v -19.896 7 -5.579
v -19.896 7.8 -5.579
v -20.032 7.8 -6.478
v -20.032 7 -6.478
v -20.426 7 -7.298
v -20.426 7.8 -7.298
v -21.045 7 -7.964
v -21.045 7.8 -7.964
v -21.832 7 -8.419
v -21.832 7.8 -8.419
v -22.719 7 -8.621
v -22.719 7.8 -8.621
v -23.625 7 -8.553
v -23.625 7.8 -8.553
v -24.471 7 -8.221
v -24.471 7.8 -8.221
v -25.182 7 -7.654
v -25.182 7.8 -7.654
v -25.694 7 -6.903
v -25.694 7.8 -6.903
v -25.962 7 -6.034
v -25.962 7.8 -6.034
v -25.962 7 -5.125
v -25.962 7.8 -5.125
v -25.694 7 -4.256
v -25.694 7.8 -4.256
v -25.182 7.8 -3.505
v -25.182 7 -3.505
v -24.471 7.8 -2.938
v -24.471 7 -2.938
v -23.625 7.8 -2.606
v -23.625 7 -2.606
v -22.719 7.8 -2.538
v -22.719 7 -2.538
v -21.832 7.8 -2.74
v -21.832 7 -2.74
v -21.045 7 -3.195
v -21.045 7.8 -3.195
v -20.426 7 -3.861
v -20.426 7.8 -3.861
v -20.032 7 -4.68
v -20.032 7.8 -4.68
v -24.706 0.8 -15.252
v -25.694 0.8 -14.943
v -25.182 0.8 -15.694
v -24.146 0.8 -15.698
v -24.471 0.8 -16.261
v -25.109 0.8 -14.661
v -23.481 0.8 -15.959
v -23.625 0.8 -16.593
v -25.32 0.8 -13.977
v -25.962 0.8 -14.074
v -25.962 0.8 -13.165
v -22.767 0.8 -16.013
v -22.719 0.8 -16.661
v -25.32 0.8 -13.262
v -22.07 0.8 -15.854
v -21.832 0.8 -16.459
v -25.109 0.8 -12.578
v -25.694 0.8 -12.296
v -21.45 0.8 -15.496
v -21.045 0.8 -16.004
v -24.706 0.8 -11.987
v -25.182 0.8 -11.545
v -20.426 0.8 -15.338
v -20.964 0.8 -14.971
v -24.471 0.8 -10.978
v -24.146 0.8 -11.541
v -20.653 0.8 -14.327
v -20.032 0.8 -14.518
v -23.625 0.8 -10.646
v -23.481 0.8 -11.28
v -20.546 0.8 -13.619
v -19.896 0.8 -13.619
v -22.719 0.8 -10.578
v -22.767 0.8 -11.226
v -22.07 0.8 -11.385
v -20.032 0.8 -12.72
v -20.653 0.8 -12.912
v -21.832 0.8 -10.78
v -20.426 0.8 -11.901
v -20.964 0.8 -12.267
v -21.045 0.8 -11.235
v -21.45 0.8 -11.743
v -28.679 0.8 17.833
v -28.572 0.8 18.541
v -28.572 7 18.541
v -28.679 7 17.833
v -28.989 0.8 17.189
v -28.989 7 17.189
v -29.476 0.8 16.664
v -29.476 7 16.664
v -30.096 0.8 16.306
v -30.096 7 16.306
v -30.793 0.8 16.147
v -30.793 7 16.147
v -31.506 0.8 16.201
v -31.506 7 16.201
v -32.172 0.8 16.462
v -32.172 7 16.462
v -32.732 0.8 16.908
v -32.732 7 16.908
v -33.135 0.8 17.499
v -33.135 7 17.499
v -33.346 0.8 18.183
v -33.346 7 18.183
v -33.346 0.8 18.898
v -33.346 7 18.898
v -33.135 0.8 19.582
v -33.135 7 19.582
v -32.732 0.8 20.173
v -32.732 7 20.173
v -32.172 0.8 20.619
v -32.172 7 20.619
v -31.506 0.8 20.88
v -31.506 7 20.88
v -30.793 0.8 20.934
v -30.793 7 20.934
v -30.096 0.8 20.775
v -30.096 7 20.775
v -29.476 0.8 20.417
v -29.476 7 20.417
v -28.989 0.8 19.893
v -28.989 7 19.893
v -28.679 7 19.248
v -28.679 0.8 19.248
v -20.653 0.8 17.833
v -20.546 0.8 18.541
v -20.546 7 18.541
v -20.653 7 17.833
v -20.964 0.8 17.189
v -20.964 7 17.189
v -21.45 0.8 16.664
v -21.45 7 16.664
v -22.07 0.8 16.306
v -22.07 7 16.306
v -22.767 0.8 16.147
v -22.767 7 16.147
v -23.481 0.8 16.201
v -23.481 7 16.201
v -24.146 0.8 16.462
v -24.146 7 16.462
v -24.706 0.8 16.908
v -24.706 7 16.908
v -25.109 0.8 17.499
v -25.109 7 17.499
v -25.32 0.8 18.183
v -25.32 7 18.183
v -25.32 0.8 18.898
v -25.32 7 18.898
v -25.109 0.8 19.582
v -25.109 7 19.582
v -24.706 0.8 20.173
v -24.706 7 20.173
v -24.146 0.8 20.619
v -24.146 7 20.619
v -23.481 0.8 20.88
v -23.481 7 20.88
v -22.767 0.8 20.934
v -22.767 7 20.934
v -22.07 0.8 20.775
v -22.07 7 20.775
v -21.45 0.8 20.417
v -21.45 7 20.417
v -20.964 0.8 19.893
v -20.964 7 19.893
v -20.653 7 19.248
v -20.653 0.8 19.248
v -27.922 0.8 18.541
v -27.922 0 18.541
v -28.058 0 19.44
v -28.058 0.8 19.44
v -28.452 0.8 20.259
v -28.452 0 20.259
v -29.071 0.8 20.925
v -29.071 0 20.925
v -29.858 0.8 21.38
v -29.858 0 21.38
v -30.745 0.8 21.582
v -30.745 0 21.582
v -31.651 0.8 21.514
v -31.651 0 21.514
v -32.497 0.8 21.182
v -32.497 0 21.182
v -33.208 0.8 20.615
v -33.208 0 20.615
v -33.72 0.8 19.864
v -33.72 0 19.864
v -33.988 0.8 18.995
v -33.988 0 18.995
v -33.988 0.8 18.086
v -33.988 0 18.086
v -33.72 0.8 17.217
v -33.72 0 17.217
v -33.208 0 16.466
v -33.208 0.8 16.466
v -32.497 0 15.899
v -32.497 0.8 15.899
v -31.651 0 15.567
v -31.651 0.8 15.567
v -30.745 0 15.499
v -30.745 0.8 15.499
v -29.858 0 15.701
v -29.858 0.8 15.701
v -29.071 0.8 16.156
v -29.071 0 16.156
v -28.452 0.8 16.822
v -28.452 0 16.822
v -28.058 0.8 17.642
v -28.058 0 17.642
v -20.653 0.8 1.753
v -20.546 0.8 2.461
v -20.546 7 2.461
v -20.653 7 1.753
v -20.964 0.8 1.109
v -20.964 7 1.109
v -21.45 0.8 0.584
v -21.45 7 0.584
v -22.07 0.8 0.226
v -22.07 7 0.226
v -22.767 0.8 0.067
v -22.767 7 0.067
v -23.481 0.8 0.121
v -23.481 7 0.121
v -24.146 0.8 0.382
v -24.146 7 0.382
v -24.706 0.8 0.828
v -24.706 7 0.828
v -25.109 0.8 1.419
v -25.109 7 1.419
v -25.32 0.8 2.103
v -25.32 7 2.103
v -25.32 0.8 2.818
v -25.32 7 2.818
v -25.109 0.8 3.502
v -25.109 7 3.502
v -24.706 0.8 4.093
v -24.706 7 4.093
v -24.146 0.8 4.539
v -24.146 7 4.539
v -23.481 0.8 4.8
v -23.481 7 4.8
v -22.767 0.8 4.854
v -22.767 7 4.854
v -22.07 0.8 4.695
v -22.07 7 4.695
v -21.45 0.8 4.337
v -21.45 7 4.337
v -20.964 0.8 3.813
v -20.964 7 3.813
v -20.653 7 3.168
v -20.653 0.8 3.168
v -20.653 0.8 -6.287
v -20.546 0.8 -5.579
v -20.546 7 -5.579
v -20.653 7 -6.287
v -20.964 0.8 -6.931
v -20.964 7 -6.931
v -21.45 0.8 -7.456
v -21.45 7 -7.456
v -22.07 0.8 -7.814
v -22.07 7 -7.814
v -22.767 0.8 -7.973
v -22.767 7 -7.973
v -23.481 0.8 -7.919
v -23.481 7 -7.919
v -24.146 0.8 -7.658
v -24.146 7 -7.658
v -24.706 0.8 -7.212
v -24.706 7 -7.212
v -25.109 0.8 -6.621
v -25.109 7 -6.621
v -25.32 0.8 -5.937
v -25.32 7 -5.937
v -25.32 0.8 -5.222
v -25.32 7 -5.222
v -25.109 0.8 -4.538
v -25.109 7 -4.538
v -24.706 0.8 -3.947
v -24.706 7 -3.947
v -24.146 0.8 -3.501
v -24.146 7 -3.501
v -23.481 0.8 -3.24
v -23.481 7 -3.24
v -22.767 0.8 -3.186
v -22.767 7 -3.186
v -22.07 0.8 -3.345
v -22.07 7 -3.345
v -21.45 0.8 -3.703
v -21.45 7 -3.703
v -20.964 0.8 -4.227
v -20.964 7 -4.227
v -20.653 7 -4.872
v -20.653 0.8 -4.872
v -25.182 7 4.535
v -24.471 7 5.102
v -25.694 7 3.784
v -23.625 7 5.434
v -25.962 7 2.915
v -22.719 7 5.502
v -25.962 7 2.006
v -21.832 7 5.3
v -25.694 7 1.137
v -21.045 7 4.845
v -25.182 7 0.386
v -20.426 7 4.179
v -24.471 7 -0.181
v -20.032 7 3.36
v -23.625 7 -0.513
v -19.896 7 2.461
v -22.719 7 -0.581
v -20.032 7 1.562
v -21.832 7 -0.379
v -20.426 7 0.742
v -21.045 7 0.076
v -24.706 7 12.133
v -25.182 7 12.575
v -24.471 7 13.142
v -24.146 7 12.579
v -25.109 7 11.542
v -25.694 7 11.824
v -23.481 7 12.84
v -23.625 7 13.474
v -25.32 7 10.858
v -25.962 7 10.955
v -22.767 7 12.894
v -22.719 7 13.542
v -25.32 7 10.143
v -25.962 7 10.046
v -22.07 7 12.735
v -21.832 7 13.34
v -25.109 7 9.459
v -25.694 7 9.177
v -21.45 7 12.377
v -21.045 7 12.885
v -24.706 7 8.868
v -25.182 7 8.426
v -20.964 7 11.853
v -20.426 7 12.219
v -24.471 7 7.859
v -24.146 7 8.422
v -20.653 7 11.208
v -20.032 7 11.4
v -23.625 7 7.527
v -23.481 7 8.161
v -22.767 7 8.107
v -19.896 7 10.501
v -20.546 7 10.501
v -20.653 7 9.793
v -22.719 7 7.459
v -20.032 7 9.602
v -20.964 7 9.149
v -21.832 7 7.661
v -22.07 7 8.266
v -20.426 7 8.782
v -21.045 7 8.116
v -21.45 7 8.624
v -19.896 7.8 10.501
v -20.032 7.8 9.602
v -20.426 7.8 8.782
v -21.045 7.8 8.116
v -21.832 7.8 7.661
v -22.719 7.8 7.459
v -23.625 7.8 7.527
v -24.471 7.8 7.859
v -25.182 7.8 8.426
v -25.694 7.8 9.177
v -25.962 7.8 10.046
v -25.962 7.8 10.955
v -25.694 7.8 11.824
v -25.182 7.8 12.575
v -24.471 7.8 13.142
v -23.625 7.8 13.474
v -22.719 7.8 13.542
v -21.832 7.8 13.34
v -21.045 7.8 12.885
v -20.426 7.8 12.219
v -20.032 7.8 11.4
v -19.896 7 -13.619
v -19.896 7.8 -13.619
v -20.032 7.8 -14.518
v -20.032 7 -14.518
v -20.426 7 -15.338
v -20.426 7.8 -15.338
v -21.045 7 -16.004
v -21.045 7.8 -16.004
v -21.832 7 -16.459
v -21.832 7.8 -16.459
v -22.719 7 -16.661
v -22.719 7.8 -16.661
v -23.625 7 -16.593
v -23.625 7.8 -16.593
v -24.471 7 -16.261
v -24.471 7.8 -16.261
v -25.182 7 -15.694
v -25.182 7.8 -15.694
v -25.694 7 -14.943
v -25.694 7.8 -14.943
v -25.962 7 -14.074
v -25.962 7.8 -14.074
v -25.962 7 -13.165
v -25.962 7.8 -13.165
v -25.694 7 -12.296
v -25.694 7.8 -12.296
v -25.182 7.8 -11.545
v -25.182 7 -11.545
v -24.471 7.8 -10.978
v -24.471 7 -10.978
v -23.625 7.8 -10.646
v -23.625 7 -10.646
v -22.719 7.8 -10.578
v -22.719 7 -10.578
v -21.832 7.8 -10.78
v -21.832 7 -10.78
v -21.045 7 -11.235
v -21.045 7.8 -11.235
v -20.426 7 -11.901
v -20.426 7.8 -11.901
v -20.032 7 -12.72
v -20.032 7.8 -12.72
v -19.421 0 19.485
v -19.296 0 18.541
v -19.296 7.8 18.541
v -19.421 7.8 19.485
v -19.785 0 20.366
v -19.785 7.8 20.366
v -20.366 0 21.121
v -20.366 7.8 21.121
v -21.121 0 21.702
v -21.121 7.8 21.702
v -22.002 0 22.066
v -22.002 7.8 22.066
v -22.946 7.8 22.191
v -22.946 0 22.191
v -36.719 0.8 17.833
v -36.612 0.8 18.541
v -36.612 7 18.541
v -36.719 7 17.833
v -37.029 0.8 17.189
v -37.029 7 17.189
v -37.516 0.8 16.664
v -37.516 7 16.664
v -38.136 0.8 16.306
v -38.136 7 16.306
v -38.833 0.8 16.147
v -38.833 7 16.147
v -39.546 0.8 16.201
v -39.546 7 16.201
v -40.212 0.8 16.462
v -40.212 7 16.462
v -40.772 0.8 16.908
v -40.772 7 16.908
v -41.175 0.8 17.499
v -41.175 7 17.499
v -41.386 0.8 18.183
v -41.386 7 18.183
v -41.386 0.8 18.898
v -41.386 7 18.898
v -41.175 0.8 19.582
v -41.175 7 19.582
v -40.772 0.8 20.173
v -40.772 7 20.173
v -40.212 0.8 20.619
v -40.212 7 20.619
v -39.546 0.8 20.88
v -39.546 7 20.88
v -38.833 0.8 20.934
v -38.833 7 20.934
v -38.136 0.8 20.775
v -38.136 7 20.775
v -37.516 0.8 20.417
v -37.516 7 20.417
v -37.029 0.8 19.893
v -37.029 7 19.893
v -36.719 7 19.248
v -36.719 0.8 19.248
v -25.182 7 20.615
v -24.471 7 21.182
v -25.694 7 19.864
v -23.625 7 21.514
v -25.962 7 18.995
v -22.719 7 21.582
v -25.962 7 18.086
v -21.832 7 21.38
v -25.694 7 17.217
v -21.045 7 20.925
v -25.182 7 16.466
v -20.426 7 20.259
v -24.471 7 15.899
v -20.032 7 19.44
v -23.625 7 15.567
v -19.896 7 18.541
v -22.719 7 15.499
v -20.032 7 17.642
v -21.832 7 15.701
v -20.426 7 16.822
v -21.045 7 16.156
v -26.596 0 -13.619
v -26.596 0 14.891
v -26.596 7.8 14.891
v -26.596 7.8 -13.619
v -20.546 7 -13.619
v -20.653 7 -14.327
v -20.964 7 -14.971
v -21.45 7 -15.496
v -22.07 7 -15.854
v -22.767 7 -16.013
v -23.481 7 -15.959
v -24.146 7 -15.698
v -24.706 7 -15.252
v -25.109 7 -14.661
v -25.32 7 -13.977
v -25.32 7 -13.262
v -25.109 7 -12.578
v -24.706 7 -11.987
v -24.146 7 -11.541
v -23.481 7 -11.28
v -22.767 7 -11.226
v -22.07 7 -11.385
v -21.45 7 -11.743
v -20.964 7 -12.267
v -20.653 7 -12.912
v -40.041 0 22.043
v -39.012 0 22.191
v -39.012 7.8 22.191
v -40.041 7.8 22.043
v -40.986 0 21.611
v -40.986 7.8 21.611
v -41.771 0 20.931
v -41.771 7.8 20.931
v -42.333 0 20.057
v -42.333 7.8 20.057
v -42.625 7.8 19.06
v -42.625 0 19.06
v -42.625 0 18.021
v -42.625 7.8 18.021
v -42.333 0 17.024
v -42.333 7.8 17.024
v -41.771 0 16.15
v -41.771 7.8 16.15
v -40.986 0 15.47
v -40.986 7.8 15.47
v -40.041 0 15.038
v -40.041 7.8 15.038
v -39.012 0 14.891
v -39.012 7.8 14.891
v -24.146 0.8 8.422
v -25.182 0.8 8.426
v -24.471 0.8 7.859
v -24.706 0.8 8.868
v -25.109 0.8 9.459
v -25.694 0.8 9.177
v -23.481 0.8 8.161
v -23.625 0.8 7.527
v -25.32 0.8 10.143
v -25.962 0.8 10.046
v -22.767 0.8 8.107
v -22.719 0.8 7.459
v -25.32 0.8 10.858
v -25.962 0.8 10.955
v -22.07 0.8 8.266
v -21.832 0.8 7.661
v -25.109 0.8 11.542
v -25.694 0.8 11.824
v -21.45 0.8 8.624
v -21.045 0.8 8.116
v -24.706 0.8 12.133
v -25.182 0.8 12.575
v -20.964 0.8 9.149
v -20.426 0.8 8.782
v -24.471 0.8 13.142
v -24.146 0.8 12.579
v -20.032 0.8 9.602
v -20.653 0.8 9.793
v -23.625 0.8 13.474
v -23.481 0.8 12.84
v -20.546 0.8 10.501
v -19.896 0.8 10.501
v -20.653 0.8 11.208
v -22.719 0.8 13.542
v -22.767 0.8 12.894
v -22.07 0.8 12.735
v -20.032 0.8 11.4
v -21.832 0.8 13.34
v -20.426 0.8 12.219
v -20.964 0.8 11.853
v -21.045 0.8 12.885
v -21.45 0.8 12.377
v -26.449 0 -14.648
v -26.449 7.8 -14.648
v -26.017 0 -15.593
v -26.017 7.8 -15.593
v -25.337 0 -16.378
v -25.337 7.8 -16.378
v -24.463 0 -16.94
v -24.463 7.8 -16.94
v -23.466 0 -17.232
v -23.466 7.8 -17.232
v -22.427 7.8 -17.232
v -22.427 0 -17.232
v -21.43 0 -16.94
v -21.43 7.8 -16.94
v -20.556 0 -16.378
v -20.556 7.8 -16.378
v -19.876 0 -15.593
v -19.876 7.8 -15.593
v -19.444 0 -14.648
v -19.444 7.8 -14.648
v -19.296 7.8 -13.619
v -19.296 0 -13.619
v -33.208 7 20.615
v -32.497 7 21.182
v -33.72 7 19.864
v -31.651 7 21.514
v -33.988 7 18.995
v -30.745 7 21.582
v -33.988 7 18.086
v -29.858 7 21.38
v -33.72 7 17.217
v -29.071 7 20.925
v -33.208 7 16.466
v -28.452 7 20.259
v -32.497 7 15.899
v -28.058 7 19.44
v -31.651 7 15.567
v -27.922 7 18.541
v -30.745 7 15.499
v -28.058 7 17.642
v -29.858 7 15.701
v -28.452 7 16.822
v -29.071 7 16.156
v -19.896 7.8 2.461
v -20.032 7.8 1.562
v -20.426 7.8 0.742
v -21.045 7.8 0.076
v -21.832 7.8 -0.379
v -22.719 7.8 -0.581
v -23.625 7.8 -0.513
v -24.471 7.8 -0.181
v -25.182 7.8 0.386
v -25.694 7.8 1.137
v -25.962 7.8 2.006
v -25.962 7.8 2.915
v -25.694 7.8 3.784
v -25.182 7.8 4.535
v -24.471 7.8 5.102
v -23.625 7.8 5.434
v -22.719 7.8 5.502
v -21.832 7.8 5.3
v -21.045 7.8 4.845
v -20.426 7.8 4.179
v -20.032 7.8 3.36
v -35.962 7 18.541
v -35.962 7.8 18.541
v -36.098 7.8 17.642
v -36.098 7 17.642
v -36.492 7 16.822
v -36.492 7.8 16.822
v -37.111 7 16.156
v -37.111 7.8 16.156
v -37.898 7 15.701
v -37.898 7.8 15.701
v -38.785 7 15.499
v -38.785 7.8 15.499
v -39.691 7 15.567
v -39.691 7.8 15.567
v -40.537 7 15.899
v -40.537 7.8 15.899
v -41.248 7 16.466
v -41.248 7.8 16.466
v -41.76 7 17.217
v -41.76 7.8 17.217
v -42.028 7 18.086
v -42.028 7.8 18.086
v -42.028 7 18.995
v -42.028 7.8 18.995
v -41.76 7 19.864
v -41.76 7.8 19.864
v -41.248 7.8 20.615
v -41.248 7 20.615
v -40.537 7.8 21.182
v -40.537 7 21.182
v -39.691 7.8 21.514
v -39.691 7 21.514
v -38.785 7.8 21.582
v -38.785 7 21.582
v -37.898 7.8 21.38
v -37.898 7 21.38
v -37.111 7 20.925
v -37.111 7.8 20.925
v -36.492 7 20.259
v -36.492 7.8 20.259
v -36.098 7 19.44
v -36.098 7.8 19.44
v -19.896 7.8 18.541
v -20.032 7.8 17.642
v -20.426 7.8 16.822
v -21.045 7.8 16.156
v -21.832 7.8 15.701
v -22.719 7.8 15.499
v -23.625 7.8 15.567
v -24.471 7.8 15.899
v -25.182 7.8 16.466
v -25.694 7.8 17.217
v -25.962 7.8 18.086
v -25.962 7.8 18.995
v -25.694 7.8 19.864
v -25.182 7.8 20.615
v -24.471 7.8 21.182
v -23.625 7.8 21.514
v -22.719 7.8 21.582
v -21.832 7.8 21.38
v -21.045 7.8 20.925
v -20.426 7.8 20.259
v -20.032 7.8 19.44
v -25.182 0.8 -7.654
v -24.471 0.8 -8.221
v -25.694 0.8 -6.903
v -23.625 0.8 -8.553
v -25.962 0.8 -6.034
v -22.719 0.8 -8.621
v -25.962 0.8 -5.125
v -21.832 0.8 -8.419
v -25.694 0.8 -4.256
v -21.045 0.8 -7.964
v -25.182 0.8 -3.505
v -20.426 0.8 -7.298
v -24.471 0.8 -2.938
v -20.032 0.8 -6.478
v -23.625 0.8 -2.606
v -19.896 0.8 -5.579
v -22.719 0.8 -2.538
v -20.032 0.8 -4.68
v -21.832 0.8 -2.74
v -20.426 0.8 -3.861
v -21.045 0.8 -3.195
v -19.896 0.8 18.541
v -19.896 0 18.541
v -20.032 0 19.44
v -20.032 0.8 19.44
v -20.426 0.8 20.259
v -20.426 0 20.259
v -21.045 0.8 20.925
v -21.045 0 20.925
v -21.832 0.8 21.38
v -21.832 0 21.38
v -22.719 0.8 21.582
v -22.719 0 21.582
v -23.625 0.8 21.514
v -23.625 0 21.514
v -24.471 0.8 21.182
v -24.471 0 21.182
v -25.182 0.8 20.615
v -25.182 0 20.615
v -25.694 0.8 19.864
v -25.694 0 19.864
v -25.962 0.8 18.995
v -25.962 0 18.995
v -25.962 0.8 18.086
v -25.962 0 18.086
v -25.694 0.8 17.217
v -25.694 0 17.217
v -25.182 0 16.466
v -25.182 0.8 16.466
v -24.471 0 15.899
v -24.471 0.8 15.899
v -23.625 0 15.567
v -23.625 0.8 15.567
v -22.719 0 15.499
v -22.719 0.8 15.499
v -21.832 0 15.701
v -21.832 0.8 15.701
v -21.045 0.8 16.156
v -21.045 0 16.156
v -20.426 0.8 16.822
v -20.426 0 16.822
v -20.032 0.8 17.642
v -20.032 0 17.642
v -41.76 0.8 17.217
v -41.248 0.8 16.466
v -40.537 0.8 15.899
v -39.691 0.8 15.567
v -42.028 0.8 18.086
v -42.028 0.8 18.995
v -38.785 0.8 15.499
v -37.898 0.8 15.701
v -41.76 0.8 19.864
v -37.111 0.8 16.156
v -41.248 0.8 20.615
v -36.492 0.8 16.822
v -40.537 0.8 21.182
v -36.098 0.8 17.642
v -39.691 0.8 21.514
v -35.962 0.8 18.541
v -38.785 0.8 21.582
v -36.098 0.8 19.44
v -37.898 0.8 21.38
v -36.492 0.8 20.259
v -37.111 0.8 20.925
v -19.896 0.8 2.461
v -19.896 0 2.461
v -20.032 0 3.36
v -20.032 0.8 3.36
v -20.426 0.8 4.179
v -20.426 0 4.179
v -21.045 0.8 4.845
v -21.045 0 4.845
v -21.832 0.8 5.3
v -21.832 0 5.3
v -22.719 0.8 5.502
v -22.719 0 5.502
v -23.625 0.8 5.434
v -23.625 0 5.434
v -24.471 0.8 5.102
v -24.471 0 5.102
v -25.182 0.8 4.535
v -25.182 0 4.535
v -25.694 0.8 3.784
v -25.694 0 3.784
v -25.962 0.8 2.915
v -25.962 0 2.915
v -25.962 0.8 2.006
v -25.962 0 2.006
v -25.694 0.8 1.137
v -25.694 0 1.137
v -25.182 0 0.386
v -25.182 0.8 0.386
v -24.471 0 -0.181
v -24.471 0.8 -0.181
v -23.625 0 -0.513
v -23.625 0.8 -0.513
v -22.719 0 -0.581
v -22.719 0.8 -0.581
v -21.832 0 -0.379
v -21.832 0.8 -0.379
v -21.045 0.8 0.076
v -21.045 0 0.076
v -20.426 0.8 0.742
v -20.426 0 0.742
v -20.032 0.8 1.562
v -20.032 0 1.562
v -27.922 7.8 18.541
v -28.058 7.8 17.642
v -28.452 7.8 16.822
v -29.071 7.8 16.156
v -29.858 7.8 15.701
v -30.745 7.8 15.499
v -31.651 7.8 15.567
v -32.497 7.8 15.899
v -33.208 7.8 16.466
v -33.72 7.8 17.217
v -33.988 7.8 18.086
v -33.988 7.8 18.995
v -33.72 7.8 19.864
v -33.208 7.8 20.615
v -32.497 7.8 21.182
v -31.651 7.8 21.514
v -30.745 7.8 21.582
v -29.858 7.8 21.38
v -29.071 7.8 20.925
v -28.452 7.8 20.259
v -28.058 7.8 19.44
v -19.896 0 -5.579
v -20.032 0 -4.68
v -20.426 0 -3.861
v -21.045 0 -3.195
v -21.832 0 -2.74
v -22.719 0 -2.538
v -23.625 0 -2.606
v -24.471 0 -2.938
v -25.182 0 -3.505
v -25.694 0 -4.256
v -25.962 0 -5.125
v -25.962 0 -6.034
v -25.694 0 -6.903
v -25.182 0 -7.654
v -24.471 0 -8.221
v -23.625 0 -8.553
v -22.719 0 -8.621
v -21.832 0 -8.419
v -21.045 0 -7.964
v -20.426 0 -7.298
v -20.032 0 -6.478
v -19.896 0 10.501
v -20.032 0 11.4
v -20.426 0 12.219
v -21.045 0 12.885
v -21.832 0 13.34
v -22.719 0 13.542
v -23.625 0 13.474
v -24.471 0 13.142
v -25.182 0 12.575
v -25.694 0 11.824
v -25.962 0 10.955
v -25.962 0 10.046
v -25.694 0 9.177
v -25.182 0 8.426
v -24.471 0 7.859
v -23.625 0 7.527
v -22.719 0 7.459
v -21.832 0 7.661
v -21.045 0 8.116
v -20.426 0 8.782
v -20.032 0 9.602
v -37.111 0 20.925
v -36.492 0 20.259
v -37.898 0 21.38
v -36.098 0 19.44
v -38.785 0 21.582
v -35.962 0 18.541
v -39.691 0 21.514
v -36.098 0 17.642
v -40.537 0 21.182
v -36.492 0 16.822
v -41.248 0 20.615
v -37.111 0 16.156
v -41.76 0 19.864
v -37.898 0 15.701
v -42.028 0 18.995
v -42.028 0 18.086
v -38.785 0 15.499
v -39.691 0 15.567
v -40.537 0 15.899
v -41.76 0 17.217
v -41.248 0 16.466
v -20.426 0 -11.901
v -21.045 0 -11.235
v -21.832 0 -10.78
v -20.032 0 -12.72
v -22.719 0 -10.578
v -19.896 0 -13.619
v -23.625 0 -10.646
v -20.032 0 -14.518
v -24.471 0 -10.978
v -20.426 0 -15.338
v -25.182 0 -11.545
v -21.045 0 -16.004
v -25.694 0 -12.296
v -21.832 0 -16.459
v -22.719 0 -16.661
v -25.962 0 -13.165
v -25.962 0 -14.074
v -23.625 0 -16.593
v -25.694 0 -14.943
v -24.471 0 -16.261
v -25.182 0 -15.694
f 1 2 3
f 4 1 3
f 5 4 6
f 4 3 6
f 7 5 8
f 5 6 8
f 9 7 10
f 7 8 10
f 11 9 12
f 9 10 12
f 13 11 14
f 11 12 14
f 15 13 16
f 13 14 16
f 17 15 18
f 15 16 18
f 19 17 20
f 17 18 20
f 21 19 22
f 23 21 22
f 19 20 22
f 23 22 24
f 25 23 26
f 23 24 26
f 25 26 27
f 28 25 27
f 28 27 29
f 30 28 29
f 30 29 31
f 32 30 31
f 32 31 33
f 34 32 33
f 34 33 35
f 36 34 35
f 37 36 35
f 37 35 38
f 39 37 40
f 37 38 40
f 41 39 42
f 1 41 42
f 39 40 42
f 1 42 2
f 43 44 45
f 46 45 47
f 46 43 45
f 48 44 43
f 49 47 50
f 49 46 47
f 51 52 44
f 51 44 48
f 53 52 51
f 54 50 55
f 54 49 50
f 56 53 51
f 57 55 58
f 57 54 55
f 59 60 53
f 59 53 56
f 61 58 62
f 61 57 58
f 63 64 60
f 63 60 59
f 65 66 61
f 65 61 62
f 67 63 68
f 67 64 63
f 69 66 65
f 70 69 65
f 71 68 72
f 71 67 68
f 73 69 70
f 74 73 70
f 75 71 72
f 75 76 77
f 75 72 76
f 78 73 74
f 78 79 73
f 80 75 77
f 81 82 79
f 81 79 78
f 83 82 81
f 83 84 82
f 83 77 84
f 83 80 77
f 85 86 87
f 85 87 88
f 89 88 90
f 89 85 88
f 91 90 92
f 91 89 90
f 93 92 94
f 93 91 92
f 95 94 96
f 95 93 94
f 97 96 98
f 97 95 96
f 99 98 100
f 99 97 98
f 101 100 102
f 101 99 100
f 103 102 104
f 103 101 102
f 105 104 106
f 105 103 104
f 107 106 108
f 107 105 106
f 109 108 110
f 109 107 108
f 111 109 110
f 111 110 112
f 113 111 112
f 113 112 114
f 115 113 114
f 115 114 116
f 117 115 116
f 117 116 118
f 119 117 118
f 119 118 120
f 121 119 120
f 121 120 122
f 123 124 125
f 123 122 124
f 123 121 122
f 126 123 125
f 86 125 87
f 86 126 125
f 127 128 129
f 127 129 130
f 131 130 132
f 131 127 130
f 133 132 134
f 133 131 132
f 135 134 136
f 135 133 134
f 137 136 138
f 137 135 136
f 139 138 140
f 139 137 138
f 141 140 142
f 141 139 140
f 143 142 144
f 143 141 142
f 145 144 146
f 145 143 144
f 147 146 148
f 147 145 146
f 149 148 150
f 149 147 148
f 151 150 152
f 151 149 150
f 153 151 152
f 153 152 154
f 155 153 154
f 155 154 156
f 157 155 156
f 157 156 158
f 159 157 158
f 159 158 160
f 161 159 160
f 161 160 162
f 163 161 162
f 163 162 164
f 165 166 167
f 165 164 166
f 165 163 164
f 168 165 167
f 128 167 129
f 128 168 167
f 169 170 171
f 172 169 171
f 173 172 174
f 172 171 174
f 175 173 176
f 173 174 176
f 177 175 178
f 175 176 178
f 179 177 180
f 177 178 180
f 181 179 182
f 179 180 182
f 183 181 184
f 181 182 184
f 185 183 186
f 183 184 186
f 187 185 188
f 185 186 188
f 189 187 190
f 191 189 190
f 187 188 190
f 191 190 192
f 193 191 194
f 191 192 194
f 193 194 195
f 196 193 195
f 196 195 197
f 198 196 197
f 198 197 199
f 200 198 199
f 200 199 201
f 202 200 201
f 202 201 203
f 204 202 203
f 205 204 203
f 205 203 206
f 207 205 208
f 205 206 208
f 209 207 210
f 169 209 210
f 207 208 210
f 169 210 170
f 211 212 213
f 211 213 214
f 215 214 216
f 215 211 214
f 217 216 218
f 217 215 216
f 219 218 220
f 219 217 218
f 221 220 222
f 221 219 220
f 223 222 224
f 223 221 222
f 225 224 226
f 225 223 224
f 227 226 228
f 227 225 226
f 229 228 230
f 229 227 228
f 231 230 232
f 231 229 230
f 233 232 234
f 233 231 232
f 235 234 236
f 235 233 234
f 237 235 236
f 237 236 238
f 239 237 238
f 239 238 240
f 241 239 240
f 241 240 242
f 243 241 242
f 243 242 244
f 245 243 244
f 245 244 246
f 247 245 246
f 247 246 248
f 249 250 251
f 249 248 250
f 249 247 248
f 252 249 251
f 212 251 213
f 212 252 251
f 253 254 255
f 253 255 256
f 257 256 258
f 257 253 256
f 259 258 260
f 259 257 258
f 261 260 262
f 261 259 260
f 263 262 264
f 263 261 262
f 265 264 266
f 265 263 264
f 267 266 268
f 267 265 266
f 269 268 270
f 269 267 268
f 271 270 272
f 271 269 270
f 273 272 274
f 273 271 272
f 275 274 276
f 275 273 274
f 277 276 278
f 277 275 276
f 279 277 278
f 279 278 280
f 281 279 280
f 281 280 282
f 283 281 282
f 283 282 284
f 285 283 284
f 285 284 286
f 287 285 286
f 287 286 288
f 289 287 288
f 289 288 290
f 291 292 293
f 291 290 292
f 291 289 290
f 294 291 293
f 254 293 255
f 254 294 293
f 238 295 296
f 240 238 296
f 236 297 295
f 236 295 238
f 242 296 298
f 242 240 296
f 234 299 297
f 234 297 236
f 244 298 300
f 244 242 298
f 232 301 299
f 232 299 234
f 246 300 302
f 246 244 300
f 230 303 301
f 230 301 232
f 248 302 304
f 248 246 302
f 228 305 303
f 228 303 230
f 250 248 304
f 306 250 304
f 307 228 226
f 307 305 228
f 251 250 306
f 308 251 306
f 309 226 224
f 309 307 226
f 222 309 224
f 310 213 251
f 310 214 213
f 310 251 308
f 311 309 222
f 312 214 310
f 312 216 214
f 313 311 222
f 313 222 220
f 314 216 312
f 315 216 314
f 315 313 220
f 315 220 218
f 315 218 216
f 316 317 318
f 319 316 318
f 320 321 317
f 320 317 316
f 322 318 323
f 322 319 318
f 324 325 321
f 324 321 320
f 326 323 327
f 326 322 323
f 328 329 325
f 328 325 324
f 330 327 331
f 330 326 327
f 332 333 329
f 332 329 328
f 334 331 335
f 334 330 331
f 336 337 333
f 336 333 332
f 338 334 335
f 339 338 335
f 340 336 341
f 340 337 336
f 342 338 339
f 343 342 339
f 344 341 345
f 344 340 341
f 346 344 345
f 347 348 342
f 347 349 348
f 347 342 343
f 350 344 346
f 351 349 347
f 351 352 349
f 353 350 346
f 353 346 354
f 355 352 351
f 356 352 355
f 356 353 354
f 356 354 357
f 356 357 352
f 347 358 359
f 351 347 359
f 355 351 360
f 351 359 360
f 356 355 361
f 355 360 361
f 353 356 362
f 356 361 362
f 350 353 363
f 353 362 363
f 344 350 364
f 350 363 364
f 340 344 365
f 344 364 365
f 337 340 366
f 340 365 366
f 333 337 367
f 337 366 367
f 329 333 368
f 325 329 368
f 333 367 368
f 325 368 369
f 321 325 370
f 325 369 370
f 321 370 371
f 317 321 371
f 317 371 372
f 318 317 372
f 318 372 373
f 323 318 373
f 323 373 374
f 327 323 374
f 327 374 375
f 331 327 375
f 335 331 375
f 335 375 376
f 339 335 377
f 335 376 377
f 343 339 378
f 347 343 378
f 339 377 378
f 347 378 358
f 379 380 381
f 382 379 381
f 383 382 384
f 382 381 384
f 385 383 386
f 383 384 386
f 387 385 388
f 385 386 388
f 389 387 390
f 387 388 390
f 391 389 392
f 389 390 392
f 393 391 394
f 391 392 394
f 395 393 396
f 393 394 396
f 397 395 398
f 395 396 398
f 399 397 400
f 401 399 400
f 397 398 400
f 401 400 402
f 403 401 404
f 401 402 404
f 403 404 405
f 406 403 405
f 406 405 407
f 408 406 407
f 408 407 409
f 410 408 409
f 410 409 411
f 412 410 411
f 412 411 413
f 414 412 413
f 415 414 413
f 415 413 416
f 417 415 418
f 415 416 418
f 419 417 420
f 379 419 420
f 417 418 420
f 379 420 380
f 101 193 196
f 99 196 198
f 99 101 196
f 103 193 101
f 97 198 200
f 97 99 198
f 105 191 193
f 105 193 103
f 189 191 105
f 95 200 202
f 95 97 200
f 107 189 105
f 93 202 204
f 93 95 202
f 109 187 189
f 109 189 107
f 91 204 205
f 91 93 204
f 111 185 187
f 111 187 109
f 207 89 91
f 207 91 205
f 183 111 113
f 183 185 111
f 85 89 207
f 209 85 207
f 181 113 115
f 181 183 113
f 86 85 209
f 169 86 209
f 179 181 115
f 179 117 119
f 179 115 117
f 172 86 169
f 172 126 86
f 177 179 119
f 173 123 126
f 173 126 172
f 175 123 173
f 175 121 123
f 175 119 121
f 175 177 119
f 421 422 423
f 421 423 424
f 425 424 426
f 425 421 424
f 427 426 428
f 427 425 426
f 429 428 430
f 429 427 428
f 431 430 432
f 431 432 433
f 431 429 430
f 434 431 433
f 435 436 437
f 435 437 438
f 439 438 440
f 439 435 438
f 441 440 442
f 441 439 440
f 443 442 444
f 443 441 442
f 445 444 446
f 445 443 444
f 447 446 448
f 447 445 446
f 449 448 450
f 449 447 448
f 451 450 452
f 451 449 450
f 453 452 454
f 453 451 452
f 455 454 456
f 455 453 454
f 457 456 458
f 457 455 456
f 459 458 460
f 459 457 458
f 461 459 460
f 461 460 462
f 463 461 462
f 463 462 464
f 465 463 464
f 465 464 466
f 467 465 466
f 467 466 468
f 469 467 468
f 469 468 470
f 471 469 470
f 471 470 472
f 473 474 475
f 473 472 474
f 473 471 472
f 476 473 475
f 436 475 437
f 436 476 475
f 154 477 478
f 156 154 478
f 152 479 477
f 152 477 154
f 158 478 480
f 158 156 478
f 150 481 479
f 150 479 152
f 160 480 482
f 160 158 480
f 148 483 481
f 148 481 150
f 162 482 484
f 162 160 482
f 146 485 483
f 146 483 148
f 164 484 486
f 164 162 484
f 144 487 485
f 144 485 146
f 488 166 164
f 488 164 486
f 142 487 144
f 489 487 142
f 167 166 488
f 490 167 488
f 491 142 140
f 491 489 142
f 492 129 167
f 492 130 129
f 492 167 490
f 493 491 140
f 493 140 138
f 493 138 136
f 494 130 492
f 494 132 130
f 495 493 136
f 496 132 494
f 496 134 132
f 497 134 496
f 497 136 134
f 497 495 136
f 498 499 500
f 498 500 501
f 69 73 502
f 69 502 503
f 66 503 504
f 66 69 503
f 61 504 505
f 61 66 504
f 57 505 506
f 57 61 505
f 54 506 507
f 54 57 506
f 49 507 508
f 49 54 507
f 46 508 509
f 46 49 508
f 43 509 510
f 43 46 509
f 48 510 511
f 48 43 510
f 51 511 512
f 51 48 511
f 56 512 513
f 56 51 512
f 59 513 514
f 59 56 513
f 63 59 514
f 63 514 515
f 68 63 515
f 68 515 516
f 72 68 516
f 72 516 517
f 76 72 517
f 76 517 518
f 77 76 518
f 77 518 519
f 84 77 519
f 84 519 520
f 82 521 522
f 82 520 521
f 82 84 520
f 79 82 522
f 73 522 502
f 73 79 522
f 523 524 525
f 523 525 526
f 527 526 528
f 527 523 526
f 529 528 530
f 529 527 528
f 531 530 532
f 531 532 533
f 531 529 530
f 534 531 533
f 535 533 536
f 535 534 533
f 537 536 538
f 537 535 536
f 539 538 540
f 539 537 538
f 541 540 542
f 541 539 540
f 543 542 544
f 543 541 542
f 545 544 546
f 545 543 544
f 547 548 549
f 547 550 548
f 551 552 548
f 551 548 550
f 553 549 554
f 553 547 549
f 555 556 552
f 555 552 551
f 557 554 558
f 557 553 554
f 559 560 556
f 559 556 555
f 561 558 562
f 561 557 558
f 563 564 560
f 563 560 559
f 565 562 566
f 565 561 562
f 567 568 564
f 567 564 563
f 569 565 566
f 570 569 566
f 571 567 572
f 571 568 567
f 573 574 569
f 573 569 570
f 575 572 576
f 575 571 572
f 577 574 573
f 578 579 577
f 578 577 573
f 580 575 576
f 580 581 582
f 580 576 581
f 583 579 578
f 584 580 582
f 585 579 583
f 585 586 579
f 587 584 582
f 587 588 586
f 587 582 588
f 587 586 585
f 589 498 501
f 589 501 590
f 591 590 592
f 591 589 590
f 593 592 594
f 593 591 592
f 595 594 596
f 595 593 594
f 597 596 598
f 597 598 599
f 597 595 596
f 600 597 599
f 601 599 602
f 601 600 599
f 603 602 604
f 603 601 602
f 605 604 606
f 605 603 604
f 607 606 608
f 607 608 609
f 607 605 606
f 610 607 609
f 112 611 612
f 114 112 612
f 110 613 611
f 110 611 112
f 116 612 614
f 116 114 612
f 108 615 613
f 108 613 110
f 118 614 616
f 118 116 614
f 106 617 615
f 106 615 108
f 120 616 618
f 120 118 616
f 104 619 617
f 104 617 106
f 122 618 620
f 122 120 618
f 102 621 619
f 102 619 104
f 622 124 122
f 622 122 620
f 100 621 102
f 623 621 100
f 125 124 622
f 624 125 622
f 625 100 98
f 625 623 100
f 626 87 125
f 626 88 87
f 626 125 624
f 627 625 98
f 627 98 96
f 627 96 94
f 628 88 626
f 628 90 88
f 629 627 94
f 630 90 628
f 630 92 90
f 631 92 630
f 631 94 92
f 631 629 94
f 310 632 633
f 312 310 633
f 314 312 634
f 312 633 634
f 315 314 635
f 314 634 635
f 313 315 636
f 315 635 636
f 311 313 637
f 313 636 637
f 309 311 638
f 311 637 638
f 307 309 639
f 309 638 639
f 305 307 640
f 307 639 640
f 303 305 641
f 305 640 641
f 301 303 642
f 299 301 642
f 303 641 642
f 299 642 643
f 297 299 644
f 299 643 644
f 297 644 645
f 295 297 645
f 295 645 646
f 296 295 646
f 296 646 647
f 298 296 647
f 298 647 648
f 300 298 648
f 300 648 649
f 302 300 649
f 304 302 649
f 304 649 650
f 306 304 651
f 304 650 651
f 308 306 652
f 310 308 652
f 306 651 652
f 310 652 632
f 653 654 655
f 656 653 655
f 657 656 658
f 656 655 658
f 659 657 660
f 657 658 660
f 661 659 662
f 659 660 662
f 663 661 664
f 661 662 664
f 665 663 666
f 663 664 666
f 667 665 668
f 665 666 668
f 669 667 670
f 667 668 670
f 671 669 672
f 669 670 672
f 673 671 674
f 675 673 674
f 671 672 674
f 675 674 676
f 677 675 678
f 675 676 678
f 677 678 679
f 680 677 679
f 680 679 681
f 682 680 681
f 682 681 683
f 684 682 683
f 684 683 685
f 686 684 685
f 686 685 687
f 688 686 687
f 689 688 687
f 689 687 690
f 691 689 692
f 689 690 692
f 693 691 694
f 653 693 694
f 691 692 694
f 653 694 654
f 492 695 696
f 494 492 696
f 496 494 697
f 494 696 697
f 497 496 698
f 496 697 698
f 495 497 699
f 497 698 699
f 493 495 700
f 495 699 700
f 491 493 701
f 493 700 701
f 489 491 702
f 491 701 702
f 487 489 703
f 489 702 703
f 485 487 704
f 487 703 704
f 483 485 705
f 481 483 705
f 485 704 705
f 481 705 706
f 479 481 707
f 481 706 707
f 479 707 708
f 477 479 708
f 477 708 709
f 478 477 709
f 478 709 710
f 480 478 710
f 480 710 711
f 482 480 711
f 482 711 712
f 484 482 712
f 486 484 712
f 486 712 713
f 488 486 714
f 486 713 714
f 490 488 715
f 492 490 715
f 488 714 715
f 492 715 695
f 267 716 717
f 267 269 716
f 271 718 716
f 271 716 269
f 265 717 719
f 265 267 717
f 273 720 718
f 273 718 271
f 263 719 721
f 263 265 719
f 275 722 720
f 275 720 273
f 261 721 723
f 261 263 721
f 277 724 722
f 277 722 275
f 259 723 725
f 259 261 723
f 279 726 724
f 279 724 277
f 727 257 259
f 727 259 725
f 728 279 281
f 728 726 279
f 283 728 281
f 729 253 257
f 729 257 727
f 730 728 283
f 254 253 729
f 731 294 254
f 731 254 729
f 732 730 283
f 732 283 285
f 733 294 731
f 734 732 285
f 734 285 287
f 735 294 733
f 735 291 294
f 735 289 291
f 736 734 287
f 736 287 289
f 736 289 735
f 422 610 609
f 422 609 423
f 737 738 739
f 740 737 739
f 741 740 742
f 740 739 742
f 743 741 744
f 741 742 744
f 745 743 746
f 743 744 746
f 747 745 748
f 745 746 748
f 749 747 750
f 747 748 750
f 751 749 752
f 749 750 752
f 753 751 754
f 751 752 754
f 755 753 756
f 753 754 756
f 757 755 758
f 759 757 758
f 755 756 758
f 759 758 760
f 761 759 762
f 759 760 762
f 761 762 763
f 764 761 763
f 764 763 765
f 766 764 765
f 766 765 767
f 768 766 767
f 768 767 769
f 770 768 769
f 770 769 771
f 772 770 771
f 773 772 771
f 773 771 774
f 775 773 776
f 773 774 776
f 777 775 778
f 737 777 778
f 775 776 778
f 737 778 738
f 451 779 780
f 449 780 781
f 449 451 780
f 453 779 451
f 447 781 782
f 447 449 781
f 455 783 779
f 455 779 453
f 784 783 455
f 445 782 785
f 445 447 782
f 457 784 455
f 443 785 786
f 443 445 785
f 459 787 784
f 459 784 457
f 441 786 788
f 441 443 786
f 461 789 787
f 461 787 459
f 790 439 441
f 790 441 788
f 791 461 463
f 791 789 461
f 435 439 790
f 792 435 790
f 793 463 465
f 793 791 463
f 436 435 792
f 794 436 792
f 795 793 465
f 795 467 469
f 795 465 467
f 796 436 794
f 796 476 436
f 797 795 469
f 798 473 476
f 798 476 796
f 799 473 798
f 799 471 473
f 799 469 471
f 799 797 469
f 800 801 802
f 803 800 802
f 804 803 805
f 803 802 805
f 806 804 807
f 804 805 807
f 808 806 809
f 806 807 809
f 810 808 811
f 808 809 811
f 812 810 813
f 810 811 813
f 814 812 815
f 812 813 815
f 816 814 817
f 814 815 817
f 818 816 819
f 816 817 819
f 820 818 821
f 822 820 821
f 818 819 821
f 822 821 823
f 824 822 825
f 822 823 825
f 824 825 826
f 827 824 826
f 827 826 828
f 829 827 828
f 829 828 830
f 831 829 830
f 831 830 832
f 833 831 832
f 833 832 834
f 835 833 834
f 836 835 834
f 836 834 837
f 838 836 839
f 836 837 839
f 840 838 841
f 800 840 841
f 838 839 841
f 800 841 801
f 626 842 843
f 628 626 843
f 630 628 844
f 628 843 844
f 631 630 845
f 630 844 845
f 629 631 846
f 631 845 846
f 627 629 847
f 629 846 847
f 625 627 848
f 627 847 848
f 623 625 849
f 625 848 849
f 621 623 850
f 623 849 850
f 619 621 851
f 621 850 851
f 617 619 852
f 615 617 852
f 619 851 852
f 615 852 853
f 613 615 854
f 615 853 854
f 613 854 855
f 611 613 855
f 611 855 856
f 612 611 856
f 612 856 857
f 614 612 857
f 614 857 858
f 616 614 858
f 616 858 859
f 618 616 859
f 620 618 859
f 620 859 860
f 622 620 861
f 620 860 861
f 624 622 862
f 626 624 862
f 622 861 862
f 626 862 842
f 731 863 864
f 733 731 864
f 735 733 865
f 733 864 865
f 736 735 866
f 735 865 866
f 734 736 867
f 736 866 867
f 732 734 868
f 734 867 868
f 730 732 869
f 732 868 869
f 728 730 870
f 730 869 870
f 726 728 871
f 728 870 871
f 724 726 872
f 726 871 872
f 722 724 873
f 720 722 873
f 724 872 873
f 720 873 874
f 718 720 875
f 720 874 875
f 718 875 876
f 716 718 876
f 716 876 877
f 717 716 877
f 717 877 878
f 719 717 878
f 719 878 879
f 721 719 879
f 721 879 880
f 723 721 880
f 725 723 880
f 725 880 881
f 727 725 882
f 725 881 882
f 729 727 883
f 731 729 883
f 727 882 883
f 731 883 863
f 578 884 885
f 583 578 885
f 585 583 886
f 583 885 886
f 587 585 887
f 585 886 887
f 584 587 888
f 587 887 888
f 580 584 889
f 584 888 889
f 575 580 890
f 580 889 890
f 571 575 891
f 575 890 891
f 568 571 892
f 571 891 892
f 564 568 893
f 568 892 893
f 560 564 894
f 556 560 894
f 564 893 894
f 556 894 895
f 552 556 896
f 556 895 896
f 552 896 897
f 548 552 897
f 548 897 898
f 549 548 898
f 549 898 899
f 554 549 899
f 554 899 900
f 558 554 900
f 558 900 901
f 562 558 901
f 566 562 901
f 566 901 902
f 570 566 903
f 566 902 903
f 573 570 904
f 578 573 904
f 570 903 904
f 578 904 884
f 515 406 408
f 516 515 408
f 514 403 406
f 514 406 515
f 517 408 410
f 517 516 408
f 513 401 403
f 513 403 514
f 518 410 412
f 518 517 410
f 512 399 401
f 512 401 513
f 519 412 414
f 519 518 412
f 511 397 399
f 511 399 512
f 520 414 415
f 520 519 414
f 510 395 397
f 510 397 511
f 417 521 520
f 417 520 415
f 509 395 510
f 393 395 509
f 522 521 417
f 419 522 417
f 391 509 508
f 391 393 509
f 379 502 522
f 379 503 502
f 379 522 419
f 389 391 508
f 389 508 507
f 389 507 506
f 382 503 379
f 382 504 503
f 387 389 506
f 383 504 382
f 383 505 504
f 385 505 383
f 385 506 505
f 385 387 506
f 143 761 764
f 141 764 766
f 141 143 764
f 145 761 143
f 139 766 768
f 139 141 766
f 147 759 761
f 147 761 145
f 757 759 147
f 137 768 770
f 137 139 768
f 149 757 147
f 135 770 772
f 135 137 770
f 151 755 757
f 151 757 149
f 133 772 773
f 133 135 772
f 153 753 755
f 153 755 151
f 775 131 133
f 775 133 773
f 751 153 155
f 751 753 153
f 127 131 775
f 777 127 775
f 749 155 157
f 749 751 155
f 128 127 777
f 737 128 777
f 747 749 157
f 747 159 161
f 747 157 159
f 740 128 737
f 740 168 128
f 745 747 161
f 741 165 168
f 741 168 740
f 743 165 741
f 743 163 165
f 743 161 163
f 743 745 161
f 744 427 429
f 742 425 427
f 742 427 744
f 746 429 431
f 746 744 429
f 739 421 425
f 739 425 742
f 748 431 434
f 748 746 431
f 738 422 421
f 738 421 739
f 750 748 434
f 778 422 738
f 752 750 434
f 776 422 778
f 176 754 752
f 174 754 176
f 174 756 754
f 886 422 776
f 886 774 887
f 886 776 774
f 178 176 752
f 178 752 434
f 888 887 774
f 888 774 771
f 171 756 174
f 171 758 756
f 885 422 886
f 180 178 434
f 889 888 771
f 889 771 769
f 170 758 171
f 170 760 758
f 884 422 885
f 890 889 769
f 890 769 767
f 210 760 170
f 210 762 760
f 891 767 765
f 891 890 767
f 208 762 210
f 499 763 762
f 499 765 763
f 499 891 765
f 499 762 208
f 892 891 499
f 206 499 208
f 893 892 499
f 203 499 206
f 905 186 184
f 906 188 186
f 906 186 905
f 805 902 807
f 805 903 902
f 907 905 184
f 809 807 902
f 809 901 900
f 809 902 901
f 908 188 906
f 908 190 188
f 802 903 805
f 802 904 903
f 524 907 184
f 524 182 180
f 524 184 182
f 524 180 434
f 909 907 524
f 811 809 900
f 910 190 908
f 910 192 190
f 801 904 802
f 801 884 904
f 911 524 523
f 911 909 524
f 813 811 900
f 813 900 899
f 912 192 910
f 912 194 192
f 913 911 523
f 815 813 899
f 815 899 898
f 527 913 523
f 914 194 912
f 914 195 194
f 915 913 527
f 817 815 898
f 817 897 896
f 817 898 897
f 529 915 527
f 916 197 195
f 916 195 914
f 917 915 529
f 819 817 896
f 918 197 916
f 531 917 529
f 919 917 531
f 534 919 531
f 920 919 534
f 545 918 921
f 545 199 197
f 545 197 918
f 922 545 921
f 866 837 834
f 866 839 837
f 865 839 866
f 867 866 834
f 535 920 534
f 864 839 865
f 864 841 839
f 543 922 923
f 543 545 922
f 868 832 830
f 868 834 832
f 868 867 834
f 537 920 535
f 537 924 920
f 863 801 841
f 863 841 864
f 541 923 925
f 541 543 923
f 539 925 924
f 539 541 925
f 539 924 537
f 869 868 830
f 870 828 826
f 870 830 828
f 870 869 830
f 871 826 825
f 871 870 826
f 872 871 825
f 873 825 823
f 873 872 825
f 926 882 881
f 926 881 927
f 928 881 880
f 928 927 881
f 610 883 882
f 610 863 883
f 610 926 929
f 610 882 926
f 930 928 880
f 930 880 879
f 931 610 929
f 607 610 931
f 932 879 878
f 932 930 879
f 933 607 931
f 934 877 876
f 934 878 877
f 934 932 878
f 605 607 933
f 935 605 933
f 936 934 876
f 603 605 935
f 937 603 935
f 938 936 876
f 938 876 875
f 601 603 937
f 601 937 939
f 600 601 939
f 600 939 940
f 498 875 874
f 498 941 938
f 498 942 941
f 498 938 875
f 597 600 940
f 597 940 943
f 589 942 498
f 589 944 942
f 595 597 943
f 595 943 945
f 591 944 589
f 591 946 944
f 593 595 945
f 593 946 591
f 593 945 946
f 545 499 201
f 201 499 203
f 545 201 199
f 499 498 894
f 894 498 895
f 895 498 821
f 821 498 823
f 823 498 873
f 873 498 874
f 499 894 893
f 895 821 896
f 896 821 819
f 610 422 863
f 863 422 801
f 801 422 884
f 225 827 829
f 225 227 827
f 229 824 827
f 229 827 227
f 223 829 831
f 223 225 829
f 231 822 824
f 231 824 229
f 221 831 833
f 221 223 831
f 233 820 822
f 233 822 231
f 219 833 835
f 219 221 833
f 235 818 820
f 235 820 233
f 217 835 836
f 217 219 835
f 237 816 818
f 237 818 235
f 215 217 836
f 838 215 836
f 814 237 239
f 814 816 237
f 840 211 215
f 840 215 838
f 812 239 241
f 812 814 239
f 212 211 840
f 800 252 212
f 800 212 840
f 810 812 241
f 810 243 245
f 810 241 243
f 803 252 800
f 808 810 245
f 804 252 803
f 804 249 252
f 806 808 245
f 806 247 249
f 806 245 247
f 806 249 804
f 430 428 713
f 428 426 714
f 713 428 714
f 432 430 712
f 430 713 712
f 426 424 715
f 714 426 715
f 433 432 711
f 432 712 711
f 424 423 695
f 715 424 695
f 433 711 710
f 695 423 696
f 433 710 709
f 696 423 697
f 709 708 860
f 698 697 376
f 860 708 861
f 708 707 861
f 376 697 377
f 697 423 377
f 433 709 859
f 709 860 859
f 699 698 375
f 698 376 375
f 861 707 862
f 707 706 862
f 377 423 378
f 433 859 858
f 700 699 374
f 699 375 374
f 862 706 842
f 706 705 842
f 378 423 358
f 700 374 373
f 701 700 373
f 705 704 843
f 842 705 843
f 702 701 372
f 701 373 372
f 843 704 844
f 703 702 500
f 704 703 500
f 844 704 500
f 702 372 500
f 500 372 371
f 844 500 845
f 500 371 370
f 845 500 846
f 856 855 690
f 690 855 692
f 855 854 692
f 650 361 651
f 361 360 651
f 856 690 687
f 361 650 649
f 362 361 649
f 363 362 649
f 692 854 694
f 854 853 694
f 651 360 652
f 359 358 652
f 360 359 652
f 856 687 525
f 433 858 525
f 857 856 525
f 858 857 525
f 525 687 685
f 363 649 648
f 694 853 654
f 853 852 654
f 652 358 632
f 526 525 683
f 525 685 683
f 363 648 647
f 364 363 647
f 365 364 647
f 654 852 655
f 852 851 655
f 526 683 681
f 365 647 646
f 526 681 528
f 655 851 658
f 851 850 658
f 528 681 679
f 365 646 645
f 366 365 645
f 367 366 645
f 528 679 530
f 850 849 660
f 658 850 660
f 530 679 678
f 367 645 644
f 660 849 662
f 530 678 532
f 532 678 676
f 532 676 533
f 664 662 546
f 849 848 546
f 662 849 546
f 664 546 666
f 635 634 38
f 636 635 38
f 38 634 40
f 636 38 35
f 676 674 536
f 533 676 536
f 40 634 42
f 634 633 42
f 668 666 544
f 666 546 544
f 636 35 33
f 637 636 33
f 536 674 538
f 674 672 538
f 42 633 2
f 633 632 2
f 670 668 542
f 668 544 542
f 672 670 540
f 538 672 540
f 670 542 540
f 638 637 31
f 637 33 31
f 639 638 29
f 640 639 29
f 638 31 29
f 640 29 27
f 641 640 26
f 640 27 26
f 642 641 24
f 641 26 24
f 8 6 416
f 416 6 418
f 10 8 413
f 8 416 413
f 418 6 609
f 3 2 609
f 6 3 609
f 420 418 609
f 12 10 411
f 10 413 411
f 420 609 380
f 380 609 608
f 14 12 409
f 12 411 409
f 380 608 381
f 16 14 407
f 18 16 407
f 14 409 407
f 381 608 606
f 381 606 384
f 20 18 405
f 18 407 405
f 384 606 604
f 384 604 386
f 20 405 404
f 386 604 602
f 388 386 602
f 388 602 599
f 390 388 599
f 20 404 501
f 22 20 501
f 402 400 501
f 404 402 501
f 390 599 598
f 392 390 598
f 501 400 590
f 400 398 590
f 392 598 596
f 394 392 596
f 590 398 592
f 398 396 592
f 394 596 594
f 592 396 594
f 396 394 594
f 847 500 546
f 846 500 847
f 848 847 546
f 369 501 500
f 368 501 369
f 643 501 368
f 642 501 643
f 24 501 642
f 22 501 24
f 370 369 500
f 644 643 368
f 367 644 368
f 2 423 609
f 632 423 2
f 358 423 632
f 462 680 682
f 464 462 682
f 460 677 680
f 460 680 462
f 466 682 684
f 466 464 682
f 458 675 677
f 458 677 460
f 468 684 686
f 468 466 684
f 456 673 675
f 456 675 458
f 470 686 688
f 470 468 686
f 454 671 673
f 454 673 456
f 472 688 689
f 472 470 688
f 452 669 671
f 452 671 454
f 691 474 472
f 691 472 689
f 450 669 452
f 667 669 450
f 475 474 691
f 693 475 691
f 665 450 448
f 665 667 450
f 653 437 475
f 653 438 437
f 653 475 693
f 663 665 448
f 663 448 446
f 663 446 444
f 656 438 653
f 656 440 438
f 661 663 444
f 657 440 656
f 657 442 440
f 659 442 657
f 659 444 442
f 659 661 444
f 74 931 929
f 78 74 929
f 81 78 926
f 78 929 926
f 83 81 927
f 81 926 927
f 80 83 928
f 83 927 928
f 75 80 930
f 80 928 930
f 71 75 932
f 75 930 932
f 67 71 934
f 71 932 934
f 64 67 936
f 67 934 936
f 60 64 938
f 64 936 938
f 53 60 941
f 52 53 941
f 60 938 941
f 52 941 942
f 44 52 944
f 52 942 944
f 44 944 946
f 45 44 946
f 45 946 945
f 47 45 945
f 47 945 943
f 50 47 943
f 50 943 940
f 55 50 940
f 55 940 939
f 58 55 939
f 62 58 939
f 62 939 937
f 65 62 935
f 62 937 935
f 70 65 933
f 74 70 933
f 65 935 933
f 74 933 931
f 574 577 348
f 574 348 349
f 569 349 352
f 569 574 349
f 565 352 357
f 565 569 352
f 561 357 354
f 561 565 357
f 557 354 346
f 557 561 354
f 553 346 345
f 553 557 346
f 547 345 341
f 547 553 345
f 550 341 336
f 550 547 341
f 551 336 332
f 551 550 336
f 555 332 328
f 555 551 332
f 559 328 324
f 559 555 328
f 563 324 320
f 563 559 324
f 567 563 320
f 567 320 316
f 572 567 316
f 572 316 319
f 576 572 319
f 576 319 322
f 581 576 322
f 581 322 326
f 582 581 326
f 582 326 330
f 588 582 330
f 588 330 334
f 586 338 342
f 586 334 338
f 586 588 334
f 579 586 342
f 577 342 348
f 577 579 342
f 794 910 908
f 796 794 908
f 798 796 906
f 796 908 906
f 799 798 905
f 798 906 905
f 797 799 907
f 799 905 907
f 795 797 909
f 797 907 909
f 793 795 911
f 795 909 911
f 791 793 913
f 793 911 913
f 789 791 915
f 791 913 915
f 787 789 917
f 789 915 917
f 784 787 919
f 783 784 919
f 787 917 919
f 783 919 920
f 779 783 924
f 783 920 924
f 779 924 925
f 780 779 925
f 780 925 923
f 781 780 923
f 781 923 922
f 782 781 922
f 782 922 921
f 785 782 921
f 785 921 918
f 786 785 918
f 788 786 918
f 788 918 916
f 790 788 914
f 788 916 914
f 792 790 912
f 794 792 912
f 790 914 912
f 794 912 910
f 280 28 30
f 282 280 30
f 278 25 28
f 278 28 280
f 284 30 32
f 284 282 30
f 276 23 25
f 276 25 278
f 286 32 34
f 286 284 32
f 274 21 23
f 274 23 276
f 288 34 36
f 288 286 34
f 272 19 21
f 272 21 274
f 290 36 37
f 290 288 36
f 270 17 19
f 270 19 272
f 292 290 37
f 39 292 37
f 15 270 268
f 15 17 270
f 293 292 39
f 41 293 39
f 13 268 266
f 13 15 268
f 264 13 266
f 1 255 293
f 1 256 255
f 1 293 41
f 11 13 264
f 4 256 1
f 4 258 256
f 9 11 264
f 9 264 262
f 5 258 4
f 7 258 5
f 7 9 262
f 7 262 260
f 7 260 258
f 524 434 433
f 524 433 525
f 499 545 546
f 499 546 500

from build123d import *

# Parameters (mm, degrees)
SKETCH1_R           = 2.4
BOSS_EXTRUDE1_DEPTH = 7.8
SKETCH2_R           = 3.05
CUT_EXTRUDE1_DEPTH  = 0.8
SKETCH3_R           = 3.05
CUT_EXTRUDE2_DEPTH  = 0.8


with BuildPart() as part:
    # Sketch1 → Boss-Extrude1 (new body)
    with BuildSketch(Plane(origin=(0, 0, 0), x_dir=(1, 0, 0), z_dir=(0, 1, 0))):
        with BuildLine():
            Line((-39.012427485, -14.890555083), (-26.596473565, -14.89055472))
            Line((-26.596473565, -14.89055472), (-26.596474399, 13.619444917))
            ThreePointArc((-26.596474399, 13.619444917), (-22.946475341, 17.269443976), (-19.296476282, 13.619444917))
            Line((-19.296476282, 13.619444917), (-19.296475341, -18.540555083))
            ThreePointArc((-19.296475341, -18.540555083), (-20.365535589, -21.121494834), (-22.946475341, -22.190555083))
            Line((-22.946475341, -22.190555083), (-39.012427485, -22.190555083))
            ThreePointArc((-39.012427485, -22.190555083), (-42.662427485, -18.540555083), (-39.012427485, -14.890555083))
        make_face()
        with Locations((-39.012427485, -18.540555083)):
            Circle(SKETCH1_R, mode=Mode.SUBTRACT)
        with Locations((-30.972427485, -18.540555083)):
            Circle(SKETCH1_R, mode=Mode.SUBTRACT)
        with Locations((-22.946475341, -18.540555083)):
            Circle(SKETCH1_R, mode=Mode.SUBTRACT)
        with Locations((-22.946475341, 13.619444917)):
            Circle(SKETCH1_R, mode=Mode.SUBTRACT)
        with Locations((-22.946475341, 5.579444917)):
            Circle(SKETCH1_R, mode=Mode.SUBTRACT)
        with Locations((-22.946475341, -2.460555083)):
            Circle(SKETCH1_R, mode=Mode.SUBTRACT)
        with Locations((-22.946475341, -10.500555083)):
            Circle(SKETCH1_R, mode=Mode.SUBTRACT)
    extrude(amount=BOSS_EXTRUDE1_DEPTH)

    # Sketch2 → Cut-Extrude1 (cut)
    with BuildSketch(Plane(origin=(0, 7.8, 0), x_dir=(1, 0, 0), z_dir=(0, 1, 0))):
        with Locations((-39.012427485, -18.540555083)):
            Circle(SKETCH2_R)
        with Locations((-30.972427485, -18.540555083)):
            Circle(SKETCH2_R)
        with Locations((-22.946475341, -18.540555083)):
            Circle(SKETCH2_R)
        with Locations((-22.946475341, -10.500555083)):
            Circle(SKETCH2_R)
        with Locations((-22.946475341, -2.460555083)):
            Circle(SKETCH2_R)
        with Locations((-22.946475341, 5.579444917)):
            Circle(SKETCH2_R)
        with Locations((-22.946475341, 13.619444917)):
            Circle(SKETCH2_R)
    extrude(amount=-CUT_EXTRUDE1_DEPTH, mode=Mode.SUBTRACT)

    # Sketch3 → Cut-Extrude2 (cut)
    with BuildSketch(Plane.XZ):
        with Locations((-30.972427485, 18.540555083)):
            Circle(SKETCH3_R)
        with Locations((-39.012427485, 18.540555083)):
            Circle(SKETCH3_R)
        with Locations((-22.946475341, 18.540555083)):
            Circle(SKETCH3_R)
        with Locations((-22.946475341, 10.500555083)):
            Circle(SKETCH3_R)
        with Locations((-22.946475341, 2.460555083)):
            Circle(SKETCH3_R)
        with Locations((-22.946475341, -5.579444917)):
            Circle(SKETCH3_R)
        with Locations((-22.946475341, -13.619444917)):
            Circle(SKETCH3_R)
    extrude(amount=-CUT_EXTRUDE2_DEPTH, mode=Mode.SUBTRACT)


solid = part.part
